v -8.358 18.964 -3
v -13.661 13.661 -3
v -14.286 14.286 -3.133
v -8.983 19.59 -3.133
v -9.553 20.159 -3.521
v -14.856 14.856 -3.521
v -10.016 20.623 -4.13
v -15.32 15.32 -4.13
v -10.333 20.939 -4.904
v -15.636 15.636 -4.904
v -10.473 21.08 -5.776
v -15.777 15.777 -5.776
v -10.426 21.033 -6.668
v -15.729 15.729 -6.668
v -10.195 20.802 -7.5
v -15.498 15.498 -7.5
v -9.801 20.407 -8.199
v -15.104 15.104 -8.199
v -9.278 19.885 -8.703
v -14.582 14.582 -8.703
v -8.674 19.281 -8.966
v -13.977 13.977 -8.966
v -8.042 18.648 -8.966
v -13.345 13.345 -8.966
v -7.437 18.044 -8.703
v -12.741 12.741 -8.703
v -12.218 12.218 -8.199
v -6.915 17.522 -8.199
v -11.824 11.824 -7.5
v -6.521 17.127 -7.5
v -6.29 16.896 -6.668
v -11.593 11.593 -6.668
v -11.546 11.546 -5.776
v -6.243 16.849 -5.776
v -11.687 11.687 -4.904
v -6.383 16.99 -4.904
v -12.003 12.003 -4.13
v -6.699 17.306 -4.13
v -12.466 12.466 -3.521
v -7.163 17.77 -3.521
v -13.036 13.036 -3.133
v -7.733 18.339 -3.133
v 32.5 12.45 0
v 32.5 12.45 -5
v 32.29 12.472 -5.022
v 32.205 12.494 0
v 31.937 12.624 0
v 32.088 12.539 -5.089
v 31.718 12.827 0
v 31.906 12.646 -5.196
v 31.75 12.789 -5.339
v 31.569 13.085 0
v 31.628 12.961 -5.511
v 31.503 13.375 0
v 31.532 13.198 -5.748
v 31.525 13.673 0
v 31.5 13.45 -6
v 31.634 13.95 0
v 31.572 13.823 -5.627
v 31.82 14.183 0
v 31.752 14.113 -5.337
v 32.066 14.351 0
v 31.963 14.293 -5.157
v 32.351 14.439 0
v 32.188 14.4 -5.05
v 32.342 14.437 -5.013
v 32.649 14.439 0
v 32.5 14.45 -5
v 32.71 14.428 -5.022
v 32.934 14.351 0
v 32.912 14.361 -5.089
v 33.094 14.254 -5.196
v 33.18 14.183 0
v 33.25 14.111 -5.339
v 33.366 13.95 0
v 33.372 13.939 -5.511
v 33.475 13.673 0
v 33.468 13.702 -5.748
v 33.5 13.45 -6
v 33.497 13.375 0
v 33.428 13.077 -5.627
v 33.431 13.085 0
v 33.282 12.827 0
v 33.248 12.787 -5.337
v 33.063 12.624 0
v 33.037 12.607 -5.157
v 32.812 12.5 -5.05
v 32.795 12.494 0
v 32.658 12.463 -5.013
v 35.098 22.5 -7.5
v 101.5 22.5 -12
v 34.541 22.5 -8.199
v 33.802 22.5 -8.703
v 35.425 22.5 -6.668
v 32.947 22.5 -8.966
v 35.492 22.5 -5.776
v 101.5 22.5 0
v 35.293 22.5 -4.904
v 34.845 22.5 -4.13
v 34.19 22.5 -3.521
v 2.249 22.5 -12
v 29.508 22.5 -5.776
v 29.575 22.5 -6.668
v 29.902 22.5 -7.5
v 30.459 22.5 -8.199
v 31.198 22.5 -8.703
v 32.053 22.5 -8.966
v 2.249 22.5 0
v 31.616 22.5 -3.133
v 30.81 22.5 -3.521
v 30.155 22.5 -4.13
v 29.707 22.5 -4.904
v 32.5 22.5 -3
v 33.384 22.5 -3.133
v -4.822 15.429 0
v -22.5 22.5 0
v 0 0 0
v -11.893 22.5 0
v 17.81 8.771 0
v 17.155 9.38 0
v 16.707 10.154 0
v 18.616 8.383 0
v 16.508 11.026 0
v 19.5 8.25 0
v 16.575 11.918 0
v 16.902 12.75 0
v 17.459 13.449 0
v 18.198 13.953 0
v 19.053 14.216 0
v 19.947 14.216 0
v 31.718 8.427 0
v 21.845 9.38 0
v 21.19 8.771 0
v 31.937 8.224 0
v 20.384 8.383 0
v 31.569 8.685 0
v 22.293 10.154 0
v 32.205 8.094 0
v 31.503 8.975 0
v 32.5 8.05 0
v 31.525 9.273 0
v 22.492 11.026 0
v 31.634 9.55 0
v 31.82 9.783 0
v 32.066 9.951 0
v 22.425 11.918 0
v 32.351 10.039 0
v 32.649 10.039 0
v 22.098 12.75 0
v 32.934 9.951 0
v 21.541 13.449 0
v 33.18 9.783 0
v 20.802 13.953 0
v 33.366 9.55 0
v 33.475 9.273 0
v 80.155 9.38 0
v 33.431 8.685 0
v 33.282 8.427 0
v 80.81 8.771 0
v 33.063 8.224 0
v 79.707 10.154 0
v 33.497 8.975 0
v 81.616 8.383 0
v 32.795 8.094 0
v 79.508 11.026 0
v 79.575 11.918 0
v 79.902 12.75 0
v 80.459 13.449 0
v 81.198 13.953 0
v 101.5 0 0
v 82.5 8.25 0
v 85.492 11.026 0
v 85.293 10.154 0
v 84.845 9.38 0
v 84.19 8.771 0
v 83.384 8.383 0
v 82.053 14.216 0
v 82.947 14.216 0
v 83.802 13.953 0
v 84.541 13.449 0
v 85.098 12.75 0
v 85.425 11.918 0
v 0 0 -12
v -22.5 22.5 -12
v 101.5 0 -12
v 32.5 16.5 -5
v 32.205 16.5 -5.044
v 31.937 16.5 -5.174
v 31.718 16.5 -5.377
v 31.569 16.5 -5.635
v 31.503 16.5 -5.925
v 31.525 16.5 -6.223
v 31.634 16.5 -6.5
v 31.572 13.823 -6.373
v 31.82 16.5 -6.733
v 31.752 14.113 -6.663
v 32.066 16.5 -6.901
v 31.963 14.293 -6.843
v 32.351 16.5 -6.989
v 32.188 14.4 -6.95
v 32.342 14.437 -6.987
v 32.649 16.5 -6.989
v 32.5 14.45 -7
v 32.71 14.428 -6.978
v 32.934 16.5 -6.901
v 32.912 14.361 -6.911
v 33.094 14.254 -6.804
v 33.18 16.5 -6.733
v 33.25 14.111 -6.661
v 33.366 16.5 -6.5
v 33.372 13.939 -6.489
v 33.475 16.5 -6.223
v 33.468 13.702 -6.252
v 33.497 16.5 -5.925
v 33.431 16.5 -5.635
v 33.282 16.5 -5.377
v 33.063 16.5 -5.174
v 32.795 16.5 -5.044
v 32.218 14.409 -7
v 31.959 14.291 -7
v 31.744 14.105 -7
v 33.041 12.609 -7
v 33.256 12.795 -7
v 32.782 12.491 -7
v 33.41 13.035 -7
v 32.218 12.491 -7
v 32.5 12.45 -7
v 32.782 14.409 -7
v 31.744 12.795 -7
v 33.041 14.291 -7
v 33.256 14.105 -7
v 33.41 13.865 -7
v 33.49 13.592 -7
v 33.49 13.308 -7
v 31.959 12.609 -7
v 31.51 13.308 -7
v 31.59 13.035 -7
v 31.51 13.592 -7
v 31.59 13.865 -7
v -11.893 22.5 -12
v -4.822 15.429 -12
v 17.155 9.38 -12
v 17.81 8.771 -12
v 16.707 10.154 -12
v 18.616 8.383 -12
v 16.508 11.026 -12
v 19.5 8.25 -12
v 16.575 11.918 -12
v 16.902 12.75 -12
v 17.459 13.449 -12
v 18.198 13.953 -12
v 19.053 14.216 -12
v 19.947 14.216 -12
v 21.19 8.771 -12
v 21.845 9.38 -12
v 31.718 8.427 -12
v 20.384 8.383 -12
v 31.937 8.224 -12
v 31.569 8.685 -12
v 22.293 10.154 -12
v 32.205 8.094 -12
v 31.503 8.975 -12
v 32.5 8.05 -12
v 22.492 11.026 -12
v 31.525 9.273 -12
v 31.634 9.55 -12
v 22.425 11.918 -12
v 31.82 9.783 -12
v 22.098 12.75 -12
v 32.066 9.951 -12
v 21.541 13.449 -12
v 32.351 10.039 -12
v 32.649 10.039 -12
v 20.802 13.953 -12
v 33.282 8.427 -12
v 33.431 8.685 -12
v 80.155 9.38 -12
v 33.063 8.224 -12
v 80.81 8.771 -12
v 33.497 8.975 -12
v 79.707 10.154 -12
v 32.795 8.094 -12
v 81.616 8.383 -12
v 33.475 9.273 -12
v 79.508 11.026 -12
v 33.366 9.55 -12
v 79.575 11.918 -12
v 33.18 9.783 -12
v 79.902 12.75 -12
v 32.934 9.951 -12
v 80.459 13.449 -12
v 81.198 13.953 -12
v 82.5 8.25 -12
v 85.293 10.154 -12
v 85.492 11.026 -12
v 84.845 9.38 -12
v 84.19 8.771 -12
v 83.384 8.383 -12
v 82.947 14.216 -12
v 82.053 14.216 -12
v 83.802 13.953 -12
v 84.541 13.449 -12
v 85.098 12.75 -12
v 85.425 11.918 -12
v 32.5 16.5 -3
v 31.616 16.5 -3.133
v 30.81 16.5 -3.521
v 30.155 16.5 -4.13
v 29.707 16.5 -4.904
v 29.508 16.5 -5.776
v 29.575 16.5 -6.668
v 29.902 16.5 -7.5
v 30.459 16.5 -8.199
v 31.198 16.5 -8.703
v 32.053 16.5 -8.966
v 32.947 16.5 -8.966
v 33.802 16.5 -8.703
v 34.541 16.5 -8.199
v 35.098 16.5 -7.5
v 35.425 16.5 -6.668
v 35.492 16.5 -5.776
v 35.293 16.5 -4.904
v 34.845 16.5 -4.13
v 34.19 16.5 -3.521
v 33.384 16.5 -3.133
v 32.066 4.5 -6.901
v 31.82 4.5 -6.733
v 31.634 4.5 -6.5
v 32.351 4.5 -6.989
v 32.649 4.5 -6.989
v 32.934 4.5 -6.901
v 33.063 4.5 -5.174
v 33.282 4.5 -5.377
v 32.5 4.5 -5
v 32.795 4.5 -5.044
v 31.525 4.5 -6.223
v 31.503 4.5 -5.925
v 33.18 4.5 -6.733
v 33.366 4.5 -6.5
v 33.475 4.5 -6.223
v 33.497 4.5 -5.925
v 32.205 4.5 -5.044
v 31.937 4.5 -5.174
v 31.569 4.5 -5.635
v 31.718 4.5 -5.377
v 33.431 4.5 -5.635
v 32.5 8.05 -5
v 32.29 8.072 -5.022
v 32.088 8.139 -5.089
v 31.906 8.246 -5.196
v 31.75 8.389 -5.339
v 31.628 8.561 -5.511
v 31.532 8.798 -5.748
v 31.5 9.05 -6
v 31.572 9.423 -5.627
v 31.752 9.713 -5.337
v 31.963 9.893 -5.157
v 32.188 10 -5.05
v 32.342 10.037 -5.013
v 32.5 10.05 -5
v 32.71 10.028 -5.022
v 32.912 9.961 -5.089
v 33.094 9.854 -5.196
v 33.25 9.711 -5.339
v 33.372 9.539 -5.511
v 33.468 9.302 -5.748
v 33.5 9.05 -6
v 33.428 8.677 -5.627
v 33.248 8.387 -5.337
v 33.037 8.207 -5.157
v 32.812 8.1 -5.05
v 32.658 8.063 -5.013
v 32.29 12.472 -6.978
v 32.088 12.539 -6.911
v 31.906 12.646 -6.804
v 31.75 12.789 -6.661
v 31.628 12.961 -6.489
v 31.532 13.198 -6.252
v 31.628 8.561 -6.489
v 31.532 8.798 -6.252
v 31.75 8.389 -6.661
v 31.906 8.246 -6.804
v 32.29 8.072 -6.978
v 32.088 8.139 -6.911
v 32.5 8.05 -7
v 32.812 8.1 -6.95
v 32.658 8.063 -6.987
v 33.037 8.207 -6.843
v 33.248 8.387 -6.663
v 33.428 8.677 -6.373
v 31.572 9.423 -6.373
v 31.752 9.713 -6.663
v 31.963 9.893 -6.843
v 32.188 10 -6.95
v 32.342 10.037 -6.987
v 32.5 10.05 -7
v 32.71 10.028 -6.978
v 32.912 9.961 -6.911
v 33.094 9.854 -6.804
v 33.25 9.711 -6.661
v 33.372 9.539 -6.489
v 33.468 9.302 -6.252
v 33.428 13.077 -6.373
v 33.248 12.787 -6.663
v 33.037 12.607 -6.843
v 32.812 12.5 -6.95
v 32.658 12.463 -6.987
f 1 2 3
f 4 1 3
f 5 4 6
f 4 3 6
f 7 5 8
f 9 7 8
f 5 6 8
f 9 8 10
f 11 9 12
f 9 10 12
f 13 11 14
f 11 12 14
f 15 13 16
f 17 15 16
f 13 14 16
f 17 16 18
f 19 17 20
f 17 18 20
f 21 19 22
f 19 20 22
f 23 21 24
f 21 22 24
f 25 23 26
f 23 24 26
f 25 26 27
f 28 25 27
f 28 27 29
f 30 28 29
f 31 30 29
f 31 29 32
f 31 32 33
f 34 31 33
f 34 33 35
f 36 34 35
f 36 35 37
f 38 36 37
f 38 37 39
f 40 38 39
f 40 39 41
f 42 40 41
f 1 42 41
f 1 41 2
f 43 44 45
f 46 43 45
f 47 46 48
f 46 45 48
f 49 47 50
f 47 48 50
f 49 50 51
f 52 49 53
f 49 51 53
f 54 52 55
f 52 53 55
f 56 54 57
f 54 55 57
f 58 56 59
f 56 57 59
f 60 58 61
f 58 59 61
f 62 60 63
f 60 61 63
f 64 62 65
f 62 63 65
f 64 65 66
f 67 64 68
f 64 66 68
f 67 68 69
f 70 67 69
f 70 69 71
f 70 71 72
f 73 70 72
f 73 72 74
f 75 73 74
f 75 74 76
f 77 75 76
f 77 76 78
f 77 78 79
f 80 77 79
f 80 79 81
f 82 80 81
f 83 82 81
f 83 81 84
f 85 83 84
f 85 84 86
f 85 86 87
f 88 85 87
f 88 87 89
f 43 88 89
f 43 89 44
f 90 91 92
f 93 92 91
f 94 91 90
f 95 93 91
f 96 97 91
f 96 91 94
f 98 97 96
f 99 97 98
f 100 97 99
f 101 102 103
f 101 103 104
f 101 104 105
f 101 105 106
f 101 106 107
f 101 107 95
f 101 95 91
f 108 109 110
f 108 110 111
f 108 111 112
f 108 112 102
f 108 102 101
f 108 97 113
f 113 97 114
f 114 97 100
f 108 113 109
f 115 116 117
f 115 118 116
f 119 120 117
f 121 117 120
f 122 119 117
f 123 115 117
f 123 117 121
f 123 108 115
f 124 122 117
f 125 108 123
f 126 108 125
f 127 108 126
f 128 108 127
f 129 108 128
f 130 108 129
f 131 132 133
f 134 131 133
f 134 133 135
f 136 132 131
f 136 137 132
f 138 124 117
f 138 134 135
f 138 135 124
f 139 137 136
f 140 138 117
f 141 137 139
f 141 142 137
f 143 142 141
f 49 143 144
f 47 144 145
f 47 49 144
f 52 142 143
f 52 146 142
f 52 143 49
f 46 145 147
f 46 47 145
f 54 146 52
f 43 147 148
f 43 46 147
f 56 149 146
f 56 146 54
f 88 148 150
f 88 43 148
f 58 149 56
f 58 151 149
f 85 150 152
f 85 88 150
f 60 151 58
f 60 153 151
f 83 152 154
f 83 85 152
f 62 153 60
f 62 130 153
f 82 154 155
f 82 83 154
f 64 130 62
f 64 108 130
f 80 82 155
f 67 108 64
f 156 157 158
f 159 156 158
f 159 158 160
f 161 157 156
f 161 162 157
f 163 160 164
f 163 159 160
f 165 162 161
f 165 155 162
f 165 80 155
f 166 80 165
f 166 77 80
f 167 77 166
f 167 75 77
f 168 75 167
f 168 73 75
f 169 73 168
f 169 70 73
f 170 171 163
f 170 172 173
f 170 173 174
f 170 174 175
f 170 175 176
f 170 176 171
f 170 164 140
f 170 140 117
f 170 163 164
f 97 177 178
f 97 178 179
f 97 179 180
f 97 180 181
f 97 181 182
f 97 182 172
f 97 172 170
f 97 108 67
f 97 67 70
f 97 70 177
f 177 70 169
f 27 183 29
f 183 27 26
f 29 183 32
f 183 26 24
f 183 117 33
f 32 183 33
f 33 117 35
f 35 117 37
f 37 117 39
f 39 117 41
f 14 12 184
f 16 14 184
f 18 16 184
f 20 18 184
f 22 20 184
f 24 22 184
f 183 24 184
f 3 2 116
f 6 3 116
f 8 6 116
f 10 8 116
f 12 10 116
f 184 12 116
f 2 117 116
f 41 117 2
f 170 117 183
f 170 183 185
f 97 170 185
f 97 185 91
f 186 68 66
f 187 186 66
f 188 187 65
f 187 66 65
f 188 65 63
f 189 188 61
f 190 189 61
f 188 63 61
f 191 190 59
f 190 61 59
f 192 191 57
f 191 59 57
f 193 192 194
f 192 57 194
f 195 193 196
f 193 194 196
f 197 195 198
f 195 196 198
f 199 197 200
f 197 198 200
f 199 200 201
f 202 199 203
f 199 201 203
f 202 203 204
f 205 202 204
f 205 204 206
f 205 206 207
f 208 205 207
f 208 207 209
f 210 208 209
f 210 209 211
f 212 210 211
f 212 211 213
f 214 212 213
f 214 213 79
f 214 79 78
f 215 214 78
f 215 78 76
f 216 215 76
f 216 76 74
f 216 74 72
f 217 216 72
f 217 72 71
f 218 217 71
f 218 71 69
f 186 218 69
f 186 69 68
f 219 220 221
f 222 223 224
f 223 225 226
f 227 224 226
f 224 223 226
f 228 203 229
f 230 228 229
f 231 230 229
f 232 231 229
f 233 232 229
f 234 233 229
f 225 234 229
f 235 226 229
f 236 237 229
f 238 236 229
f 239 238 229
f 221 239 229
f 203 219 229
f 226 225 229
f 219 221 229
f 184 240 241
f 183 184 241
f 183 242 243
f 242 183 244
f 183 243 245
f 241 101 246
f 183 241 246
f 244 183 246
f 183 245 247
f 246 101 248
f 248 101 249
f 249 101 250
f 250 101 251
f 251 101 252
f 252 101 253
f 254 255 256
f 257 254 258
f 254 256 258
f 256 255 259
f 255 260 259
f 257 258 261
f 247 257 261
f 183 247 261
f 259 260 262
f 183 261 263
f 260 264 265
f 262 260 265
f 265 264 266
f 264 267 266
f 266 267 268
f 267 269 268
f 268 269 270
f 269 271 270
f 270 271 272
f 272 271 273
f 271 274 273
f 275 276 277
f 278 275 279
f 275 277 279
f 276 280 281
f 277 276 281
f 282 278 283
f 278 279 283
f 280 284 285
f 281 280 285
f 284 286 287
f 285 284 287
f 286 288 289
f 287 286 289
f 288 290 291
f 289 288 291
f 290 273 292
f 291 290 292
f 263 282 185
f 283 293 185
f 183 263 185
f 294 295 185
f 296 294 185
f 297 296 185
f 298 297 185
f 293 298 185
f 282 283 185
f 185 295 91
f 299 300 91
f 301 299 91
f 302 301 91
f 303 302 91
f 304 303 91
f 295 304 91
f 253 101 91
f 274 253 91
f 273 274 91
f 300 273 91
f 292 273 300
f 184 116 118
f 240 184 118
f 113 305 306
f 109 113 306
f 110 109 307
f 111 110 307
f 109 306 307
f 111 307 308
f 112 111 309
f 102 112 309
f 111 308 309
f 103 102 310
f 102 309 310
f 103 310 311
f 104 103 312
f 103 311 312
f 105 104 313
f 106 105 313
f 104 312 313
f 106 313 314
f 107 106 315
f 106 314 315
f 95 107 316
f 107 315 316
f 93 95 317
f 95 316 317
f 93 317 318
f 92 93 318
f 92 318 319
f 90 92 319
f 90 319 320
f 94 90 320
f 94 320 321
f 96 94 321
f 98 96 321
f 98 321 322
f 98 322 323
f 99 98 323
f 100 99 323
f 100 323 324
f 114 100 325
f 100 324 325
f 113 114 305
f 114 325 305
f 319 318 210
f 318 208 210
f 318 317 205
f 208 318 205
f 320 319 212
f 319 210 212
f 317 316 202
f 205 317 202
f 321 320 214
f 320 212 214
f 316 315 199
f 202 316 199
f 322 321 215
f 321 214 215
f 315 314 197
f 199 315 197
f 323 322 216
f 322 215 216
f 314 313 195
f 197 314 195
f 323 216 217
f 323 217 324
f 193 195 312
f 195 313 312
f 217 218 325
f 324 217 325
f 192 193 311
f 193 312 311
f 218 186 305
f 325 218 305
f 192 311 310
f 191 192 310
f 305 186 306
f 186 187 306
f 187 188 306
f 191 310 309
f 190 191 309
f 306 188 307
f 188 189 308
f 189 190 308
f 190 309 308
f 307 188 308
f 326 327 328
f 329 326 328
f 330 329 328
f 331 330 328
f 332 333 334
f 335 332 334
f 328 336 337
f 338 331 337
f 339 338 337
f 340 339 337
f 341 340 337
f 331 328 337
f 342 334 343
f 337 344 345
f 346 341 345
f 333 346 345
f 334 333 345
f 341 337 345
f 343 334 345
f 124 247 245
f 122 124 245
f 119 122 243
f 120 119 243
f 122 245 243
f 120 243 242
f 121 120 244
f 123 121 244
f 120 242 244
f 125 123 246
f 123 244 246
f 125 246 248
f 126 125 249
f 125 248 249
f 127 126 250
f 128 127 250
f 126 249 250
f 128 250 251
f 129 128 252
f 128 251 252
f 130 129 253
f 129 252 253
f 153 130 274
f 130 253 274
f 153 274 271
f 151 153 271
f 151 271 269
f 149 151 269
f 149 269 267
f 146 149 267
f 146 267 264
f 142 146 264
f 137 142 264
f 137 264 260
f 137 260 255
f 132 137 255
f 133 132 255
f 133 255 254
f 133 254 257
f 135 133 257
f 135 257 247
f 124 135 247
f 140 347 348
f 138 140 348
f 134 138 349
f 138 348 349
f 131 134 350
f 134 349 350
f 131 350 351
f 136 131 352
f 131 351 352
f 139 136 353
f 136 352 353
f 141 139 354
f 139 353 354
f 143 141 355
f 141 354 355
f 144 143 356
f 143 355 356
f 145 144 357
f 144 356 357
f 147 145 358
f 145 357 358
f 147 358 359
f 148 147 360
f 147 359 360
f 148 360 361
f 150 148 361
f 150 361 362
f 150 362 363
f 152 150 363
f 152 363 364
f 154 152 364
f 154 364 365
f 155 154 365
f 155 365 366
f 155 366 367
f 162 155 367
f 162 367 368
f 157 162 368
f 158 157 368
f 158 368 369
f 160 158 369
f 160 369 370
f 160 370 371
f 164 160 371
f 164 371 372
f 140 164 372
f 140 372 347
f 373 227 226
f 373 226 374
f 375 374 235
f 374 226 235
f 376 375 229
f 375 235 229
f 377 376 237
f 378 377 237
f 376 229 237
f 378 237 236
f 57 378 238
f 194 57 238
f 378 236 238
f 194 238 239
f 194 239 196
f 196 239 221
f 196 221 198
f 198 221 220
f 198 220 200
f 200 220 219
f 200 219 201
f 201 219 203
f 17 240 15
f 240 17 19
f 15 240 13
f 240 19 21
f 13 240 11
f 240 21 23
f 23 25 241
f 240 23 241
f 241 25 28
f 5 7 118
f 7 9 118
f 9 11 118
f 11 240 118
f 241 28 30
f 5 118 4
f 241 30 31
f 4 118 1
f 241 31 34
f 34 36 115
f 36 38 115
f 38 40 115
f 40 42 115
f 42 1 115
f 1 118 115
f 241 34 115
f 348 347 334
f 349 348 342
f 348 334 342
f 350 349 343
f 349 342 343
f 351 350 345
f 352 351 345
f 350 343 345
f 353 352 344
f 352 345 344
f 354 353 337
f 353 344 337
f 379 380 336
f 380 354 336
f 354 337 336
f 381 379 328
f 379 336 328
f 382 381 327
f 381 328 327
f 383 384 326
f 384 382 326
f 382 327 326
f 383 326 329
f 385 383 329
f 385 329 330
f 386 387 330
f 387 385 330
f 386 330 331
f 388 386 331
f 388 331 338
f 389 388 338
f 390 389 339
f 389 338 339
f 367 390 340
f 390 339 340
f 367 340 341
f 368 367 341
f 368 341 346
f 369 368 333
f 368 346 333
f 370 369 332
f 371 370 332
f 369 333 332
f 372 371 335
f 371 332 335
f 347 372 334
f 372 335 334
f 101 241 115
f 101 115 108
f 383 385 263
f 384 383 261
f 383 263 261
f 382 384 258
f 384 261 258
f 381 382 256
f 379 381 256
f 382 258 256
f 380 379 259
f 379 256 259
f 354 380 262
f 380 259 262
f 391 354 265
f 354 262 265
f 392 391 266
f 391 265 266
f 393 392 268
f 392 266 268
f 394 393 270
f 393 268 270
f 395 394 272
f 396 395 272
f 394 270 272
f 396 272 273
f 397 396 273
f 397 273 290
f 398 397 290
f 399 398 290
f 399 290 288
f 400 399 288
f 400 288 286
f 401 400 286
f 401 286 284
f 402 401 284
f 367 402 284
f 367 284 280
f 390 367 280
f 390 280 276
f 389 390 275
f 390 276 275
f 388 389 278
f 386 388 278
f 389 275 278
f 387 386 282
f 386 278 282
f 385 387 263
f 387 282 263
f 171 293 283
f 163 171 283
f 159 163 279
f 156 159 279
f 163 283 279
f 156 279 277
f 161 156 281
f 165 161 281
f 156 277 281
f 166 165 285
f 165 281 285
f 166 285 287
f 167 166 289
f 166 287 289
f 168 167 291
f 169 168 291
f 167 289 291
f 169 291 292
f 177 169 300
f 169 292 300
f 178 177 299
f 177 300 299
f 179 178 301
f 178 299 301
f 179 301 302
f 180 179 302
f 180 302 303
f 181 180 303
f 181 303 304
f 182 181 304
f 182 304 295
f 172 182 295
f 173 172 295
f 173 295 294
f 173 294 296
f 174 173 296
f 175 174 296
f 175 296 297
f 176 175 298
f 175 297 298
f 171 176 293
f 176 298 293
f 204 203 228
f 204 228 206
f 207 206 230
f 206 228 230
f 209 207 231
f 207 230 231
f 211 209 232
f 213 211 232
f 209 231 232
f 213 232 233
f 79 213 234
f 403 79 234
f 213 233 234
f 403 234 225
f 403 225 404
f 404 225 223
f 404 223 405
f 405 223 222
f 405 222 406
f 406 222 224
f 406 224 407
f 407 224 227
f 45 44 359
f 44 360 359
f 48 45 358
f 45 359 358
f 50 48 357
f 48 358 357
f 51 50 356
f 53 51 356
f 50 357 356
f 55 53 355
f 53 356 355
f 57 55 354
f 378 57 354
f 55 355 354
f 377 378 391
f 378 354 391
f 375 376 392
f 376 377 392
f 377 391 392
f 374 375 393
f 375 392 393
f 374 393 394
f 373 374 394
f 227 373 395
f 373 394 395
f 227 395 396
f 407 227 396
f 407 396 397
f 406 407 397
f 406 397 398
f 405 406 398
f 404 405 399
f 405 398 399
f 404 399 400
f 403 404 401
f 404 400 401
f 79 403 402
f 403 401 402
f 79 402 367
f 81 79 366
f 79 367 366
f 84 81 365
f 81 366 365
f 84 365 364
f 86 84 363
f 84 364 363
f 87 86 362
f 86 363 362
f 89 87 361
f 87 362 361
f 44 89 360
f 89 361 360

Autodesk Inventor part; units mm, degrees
ref_plane "YZ Plane" through (0, 0, 0) normal (1, 0, 0) x (0, 1, 0)
ref_plane "XZ Plane" through (0, 0, 0) normal (0, 1, 0) x (-1, 0, 0)
ref_plane "XY Plane" through (0, 0, 0) normal (0, 0, 1) x (1, 0, 0)
sketch "Esboço1" plane through (0, 0, 0) normal (0, 0, 1) x (1, 0, 0)
  line L0 (0, 0) -> (101.5, 0)
  line L1 (0, 0) -> (-22.5, 22.5)
  line L2 (0, 0) -> (30, 0) construction
  line L3 (101.5, 0) -> (101.5, 22.5)
  line L4 (-22.5, 22.5) -> (-11.8934, 22.5)
  line L5 (-11.8934, 22.5) -> (-4.8223, 15.4289)
  line L6 (101.5, 22.5) -> (2.2487, 22.5)
  line L7 (-11.8934, 22.5) -> (-22.5, 22.5)
  line L8 (-22.5, 22.5) -> (-34.2669, 34.2669)
  line L9 (-4.8223, 15.4289) -> (-28.9636, 39.5702)
  line L10 (-4.8223, 15.4289) -> (2.2487, 22.5)
  dimension "d0" = 101.5
  dimension "d2" = 135
  dimension "d3" = 22.5
  dimension "d5" = 10
  dimension "d51" = 7.5
extrude "Extrusão1" add sketch "Esboço1" against normal blind 12
sketch "Esboço2" plane through (0, 0, 0) normal (0, 0, 1) x (1, 0, 0)
  line L0 (101.5, 22.5) -> (101.5, 0) projected
  line L1 (0, 0) -> (-22.5, 22.5) projected
  line L2 (2.2487, 22.5) -> (101.5, 22.5) projected
  line L3 (101.5, 22.5) -> (82.5, 22.5)
  point P0 (82.5, 11.25)
  point P1 (19.5, 11.25)
  point P2 (32.5, 13.45)
  point P3 (32.5, 9.05)
hole "Furo1" at (82.5, 11.25, 0) at (19.5, 11.25, 0) direction (0, 0, -1) diameter 6 end through all
hole "Furo2" at (32.5, 13.45, 0) direction (0, 0, -1) diameter 2 depth 7
hole "Furo3" at (32.5, 9.05, 0) direction (0, 0, -1) diameter 2 end through all
sketch "Esboço3" plane through (-4.8223, 15.4289, -12) normal (0.7071068, 0.7071068, 0) x (-0.7071068, 0.7071068, 0)
  line L0 (0, 12) -> (0, 0) projected
  line L1 (0, 6) -> (5, 6)
  point P0 (-14.3198, 12)
  dimension "d34" = 5
hole "Furo4" at (-8.3579, 18.9645, -6) direction (-0.7071068, -0.7071068, 0) diameter 6 end through all
sketch "Esboço4" plane through (2.2487, 22.5, 0) normal (0, 1, 0) x (1, 0, 0)
  line L0 (0, 0) -> (0, 12) projected
  line L1 (0, 12) -> (0, 5.7893)
  line L2 (99.2513, 12) -> (0, 12) projected
  line L3 (31.2513, 0) -> (29.2513, 0) projected
  line L4 (30.2513, 0) -> (30.2513, 6)
  point P0 (-2.2487, 0)
  dimension "d42" = 6.2107
hole "Furo5" at (32.5, 22.5, -6) direction (0, -1, 0) diameter 2 depth 18 counterbore diameter 6 counterbore depth 6
fillet "Arredondamento1" [suppressed]
properties part number "main_frame" material "Aluminum 6061-AHC"
